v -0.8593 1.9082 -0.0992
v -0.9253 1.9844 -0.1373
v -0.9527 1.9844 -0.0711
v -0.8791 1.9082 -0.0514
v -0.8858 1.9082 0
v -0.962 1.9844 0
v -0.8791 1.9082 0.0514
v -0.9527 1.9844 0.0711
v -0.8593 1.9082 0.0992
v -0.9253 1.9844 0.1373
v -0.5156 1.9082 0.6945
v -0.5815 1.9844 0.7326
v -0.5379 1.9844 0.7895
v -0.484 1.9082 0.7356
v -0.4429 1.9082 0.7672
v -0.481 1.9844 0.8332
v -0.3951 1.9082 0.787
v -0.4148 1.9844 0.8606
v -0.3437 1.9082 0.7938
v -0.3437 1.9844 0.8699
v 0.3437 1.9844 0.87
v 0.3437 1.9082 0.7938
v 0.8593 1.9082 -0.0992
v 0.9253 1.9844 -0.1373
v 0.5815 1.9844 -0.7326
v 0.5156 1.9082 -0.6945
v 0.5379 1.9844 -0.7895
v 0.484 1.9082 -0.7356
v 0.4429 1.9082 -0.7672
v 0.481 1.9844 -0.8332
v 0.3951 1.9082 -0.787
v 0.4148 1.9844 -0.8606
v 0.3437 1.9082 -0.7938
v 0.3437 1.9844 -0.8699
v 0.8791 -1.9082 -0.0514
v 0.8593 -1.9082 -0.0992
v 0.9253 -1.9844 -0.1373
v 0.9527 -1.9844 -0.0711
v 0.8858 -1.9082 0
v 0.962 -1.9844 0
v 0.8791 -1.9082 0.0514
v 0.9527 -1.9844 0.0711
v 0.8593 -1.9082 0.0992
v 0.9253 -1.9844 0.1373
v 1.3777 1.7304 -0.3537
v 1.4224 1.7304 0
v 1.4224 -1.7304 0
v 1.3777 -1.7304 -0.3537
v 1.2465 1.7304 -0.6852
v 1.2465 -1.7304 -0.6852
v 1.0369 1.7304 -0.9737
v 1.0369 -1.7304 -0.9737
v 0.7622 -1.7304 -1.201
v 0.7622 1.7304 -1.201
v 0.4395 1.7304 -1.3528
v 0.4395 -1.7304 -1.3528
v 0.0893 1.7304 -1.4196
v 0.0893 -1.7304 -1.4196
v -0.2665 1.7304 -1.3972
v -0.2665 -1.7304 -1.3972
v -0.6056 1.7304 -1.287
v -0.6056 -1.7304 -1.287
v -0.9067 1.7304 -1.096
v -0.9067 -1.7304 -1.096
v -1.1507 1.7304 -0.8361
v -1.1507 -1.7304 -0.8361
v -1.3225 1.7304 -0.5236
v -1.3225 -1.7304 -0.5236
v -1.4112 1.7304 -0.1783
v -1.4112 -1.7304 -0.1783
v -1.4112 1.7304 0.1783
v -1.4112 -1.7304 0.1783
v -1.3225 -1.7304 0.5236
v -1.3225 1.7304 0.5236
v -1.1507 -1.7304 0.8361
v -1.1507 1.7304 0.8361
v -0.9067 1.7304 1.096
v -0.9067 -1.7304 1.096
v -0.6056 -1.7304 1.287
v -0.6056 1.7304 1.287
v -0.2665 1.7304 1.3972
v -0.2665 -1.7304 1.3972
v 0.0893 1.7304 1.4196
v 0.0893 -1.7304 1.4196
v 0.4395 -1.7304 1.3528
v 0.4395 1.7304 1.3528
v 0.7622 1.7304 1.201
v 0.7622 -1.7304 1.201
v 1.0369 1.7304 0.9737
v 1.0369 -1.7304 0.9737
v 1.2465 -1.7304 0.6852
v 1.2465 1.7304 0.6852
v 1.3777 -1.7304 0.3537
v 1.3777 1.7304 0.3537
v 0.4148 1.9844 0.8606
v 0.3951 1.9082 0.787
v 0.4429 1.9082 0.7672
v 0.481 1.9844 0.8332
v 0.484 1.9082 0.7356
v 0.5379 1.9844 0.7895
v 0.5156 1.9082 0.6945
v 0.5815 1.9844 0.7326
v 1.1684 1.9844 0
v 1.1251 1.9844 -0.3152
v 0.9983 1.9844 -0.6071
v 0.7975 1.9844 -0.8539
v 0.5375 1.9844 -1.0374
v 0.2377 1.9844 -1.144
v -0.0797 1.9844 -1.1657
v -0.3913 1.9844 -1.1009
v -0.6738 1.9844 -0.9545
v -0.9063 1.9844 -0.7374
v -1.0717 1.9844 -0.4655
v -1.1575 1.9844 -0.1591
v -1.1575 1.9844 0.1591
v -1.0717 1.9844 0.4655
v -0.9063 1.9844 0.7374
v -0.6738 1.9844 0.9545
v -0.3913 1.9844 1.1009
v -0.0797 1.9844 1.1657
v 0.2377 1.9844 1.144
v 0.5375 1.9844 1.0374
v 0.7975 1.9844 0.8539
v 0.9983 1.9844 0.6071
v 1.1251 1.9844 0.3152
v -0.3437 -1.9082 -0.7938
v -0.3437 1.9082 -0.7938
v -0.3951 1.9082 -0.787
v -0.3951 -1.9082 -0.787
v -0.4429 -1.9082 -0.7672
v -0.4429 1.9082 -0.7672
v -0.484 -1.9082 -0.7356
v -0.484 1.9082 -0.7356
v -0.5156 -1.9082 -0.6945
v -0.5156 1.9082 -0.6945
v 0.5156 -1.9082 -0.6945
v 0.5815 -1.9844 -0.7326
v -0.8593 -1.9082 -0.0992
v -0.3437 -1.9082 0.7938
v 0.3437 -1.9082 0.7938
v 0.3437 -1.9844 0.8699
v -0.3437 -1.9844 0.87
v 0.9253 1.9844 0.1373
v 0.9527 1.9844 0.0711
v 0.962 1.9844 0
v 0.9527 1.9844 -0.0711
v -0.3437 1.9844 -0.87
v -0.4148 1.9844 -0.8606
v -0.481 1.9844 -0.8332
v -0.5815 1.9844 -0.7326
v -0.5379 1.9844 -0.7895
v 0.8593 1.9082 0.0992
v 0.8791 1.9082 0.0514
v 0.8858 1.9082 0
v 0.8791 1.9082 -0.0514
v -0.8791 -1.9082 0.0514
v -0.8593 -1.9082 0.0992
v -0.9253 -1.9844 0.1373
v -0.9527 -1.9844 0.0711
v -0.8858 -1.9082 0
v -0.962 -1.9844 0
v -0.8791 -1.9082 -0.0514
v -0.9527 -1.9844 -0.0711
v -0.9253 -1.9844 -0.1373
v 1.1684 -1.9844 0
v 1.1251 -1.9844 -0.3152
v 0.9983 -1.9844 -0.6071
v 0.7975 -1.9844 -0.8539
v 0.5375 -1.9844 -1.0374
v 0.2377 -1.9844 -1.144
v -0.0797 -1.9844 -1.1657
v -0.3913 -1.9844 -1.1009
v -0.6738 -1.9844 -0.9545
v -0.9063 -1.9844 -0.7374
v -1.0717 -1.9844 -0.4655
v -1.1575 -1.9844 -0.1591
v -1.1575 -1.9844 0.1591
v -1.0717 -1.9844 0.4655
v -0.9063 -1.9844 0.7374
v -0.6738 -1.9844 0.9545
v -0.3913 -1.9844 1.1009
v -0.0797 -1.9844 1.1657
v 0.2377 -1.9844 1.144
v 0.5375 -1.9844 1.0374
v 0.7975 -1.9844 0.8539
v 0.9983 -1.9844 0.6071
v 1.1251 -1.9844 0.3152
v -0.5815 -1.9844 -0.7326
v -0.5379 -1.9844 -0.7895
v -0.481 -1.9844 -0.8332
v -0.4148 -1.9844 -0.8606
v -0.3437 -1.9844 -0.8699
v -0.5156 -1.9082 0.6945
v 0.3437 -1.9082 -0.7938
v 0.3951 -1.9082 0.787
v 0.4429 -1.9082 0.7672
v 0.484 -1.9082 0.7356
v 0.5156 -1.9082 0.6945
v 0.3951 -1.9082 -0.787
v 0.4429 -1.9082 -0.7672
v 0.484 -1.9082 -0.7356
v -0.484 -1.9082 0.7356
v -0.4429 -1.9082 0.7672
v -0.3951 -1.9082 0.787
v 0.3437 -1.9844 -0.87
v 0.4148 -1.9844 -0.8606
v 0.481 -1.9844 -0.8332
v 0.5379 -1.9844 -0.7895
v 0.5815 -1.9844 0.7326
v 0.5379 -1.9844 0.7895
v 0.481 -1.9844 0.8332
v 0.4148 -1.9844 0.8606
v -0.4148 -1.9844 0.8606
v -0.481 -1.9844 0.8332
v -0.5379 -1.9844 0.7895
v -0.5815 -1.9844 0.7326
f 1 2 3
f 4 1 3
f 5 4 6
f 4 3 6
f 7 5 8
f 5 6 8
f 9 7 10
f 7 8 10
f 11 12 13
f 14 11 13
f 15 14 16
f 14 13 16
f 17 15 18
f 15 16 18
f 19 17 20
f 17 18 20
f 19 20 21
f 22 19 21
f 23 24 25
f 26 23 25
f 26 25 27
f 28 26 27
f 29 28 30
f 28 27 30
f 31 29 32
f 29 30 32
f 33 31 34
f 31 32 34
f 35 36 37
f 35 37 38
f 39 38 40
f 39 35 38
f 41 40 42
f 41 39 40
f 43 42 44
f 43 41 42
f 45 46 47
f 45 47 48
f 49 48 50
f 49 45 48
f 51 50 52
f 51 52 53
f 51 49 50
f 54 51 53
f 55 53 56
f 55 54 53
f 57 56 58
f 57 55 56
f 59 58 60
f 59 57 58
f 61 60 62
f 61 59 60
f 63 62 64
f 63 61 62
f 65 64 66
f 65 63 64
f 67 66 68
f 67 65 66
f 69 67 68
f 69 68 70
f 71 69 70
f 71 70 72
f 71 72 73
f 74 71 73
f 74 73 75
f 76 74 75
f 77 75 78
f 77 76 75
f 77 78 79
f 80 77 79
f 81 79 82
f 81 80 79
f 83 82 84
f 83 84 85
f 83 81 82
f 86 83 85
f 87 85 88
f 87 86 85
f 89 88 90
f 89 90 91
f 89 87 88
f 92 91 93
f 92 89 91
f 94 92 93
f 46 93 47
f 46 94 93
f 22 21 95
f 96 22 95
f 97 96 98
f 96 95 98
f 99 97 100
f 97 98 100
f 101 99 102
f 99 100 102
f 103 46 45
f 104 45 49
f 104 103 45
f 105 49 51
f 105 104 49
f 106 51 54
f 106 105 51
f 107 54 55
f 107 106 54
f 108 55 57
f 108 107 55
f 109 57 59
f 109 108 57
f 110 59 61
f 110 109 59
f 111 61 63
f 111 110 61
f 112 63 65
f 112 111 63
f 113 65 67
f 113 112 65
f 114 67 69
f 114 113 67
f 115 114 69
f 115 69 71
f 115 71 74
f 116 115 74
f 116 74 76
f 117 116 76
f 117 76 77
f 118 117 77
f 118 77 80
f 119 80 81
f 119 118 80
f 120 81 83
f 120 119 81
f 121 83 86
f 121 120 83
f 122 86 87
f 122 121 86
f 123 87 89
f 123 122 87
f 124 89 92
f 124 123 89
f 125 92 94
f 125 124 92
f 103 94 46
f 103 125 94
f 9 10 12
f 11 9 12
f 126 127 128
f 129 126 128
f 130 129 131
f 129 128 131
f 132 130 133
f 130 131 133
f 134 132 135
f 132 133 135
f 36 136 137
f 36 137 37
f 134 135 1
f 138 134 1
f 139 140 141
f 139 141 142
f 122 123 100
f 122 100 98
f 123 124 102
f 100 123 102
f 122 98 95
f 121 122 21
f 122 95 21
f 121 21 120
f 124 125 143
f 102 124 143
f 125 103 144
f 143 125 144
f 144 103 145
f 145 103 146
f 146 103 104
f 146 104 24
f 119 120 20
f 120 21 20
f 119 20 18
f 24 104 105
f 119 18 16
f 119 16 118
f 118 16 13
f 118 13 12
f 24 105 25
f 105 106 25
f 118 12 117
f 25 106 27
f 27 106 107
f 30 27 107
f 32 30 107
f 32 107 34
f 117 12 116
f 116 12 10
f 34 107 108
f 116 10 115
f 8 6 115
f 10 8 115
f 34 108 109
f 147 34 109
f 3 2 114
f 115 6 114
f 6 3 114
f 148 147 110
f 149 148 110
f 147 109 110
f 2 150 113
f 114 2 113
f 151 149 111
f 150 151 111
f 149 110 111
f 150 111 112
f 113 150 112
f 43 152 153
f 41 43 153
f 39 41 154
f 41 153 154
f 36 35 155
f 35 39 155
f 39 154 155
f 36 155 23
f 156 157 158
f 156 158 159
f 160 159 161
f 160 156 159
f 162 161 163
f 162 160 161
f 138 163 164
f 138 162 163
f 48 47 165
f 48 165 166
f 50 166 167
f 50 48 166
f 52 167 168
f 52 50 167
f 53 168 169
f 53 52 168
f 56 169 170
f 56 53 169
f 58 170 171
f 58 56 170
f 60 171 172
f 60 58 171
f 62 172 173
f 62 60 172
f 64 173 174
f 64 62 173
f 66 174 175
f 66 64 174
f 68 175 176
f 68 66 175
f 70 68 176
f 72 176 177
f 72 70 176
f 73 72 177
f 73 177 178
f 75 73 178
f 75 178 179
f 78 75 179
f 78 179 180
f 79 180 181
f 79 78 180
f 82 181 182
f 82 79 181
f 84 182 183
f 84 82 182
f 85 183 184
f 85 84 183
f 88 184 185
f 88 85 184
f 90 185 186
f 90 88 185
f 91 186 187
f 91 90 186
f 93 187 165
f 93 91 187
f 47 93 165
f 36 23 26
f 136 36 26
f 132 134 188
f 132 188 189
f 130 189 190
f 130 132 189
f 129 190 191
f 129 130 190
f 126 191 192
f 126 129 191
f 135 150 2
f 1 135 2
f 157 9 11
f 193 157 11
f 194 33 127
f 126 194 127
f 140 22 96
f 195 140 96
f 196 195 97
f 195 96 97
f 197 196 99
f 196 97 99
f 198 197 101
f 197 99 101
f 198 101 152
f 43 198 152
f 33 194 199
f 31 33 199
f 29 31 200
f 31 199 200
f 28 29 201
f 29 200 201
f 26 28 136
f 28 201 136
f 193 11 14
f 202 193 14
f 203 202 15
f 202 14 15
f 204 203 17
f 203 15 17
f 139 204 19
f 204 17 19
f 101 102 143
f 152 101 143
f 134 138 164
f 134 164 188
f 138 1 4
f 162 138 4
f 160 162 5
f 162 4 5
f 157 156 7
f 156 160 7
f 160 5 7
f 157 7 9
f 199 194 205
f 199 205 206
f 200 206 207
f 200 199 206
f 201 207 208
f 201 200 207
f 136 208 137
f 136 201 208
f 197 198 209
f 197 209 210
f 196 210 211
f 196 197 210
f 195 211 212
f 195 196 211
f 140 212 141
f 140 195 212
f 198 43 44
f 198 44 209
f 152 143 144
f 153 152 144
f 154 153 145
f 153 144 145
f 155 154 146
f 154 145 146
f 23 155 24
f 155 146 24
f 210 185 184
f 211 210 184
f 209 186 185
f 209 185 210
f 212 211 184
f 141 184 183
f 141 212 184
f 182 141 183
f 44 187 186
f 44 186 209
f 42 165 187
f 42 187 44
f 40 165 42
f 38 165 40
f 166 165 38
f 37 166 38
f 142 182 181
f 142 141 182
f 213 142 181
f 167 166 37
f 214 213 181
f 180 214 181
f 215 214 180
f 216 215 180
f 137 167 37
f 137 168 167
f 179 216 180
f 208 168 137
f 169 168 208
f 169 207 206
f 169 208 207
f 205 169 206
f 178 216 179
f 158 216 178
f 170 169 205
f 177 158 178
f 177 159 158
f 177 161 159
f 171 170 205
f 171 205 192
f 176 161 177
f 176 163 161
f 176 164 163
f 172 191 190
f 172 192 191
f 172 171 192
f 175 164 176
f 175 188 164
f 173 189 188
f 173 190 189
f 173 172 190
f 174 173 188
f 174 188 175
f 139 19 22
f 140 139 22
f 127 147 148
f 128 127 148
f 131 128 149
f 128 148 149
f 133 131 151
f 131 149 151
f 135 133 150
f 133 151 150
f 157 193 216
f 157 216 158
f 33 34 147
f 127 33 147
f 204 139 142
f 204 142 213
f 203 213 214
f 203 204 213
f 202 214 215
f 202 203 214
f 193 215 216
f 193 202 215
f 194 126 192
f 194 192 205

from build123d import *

# Parameters (mm, degrees)
SKETCH1_W               = 1.4224
SKETCH1_H               = 3.96875
CUT_EXTRUDE1_DEPTH      = 2.984375
CUT_EXTRUDE1_DEPTH_BACK = 2.984375
FILLET1_R               = 0.1984375
CHAMFER1_SIZE           = 0.254
CHAMFER2_SIZE           = 0.0762


with BuildPart() as part:
    # Sketch1 → Revolve1 (revolve)
    with BuildSketch(Plane.XY):
        with Locations((0.7112, 0)):
            Rectangle(SKETCH1_W, SKETCH1_H)
    revolve(axis=Axis((0, -1.704166029, 0), (0, 1, 0)))

    # Sketch3 → Cut-Extrude1 (cut, two sides)
    with BuildSketch(Plane(origin=(0, 0, 0), x_dir=(1, 0, 0), z_dir=(0, 1, 0))) as cut_extrude1_sk:
        Polygon((0.916543552, 0), (0.458271776, 0.79375), (-0.458271776, 0.79375), (-0.916543552, 0), (-0.458271776, -0.79375), (0.458271776, -0.79375), align=None)
    extrude(amount=CUT_EXTRUDE1_DEPTH, mode=Mode.SUBTRACT)
    extrude(cut_extrude1_sk.sketch, amount=-CUT_EXTRUDE1_DEPTH_BACK, mode=Mode.SUBTRACT)

    # Fillet1
    fillet1_edges = [part.edges().sort_by_distance(p)[0] for p in [
        (0.458271776, 0, -0.79375),
        (0.916543552, 0, 0),
        (0.458271776, 0, 0.79375),
        (-0.458271776, 0, 0.79375),
        (-0.916543552, 0, 0),
        (-0.458271776, 0, -0.79375),
    ]]
    fillet(fillet1_edges, radius=FILLET1_R)

    # Chamfer1
    chamfer1_edges = [part.edges().sort_by_distance(p)[0] for p in [
        (-1.4224, 1.984375, 0),
        (-1.4224, -1.984375, 0),
    ]]
    chamfer(chamfer1_edges, length=CHAMFER1_SIZE)

    # Chamfer2
    chamfer2_edges = [part.edges().sort_by_distance(p)[0] for p in [
        (0.687407664, -1.984375, -0.396875),
        (0.687407664, 1.984375, -0.396875),
        (0.687407664, -1.984375, 0.396875),
        (0.687407664, 1.984375, 0.396875),
        (0, -1.984375, 0.79375),
        (0, 1.984375, 0.79375),
        (-0.687407664, -1.984375, 0.396875),
        (-0.687407664, 1.984375, 0.396875),
        (-0.687407664, -1.984375, -0.396875),
        (-0.687407664, 1.984375, -0.396875),
        (0, -1.984375, -0.79375),
        (0, 1.984375, -0.79375),
        (0.885845164, 1.984375, 0),
        (0.885845164, -1.984375, 0),
        (0.442922582, 1.984375, 0.767164416),
        (0.442922582, -1.984375, 0.767164416),
        (-0.442922582, 1.984375, 0.767164416),
        (-0.442922582, -1.984375, 0.767164416),
        (-0.885845164, 1.984375, 0),
        (-0.885845164, -1.984375, 0),
        (-0.442922582, 1.984375, -0.767164416),
        (-0.442922582, -1.984375, -0.767164416),
        (0.442922582, 1.984375, -0.767164416),
        (0.442922582, -1.984375, -0.767164416),
    ]]
    chamfer(chamfer2_edges, length=CHAMFER2_SIZE)


solid = part.part
